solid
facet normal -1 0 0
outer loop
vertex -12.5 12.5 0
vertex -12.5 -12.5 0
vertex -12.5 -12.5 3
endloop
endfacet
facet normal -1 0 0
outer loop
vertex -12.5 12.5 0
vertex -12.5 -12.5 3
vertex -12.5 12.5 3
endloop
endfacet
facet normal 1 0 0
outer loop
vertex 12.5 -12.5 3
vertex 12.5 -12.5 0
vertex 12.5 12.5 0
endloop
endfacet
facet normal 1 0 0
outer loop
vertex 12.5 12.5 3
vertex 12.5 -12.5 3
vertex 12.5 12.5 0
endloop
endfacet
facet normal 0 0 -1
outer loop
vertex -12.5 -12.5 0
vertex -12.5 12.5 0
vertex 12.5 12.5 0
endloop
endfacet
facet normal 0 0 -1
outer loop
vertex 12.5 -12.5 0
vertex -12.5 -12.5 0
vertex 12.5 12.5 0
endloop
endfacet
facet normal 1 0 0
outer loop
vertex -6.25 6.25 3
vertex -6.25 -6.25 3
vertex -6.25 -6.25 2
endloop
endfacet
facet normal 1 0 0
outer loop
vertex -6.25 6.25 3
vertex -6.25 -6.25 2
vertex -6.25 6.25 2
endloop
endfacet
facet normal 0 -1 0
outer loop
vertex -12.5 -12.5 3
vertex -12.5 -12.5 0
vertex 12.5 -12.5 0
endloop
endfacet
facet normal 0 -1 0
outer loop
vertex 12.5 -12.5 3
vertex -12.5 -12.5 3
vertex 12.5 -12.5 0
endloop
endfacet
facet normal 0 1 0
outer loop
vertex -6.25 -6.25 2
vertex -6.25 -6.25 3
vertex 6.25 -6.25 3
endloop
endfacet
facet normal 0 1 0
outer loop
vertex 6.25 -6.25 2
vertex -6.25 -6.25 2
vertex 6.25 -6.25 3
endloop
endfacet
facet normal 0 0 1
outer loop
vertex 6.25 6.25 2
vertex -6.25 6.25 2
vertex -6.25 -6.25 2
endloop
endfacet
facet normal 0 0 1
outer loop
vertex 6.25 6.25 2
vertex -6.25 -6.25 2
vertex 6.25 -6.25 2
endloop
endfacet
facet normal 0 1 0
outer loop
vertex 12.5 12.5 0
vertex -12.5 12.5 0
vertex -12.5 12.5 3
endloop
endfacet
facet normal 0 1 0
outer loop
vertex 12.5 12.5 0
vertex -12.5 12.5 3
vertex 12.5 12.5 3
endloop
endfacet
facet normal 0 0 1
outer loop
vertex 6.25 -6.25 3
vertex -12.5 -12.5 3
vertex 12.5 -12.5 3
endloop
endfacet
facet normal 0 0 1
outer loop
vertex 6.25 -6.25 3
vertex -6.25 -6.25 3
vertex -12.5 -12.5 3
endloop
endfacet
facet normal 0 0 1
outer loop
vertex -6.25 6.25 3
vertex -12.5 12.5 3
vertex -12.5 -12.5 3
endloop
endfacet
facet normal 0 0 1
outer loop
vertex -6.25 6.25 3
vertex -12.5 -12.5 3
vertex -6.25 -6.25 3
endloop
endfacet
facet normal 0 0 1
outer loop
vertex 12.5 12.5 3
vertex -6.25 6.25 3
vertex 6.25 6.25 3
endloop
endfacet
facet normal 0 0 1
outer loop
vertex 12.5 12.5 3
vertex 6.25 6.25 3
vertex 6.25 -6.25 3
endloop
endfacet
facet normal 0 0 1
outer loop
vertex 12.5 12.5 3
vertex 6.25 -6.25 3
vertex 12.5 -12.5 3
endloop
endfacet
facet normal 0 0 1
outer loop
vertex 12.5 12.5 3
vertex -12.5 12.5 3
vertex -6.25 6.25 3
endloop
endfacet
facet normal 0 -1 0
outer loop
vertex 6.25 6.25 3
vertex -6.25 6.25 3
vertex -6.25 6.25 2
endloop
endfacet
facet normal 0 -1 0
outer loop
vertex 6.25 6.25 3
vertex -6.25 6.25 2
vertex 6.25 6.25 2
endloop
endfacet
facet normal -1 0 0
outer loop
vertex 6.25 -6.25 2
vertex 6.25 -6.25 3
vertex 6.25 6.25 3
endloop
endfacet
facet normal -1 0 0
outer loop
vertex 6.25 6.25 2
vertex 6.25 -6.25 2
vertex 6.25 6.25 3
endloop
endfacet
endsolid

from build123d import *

# Parameters (mm, degrees)
F0_W     = 25
F0_H     = 25
F1_DEPTH = 3
F2_W     = 12.5
F2_H     = 12.5
F3_DEPTH = 1


with BuildPart() as f1:
    # F0 (on Top) → F1 (new body)
    with BuildSketch(Plane.XY):
        Rectangle(F0_W, F0_H)
    extrude(amount=F1_DEPTH)


with BuildPart() as f3:
    # F2 (on face) → F3 (new body)
    with BuildSketch(Plane.XY.offset(3)):
        Rectangle(F2_W, F2_H)
    extrude(amount=-F3_DEPTH)


with BuildPart() as f1_1:
    add(f1.part)

    # F4: cut F3
    add(f3.part, mode=Mode.SUBTRACT)


solid = f1_1.part
